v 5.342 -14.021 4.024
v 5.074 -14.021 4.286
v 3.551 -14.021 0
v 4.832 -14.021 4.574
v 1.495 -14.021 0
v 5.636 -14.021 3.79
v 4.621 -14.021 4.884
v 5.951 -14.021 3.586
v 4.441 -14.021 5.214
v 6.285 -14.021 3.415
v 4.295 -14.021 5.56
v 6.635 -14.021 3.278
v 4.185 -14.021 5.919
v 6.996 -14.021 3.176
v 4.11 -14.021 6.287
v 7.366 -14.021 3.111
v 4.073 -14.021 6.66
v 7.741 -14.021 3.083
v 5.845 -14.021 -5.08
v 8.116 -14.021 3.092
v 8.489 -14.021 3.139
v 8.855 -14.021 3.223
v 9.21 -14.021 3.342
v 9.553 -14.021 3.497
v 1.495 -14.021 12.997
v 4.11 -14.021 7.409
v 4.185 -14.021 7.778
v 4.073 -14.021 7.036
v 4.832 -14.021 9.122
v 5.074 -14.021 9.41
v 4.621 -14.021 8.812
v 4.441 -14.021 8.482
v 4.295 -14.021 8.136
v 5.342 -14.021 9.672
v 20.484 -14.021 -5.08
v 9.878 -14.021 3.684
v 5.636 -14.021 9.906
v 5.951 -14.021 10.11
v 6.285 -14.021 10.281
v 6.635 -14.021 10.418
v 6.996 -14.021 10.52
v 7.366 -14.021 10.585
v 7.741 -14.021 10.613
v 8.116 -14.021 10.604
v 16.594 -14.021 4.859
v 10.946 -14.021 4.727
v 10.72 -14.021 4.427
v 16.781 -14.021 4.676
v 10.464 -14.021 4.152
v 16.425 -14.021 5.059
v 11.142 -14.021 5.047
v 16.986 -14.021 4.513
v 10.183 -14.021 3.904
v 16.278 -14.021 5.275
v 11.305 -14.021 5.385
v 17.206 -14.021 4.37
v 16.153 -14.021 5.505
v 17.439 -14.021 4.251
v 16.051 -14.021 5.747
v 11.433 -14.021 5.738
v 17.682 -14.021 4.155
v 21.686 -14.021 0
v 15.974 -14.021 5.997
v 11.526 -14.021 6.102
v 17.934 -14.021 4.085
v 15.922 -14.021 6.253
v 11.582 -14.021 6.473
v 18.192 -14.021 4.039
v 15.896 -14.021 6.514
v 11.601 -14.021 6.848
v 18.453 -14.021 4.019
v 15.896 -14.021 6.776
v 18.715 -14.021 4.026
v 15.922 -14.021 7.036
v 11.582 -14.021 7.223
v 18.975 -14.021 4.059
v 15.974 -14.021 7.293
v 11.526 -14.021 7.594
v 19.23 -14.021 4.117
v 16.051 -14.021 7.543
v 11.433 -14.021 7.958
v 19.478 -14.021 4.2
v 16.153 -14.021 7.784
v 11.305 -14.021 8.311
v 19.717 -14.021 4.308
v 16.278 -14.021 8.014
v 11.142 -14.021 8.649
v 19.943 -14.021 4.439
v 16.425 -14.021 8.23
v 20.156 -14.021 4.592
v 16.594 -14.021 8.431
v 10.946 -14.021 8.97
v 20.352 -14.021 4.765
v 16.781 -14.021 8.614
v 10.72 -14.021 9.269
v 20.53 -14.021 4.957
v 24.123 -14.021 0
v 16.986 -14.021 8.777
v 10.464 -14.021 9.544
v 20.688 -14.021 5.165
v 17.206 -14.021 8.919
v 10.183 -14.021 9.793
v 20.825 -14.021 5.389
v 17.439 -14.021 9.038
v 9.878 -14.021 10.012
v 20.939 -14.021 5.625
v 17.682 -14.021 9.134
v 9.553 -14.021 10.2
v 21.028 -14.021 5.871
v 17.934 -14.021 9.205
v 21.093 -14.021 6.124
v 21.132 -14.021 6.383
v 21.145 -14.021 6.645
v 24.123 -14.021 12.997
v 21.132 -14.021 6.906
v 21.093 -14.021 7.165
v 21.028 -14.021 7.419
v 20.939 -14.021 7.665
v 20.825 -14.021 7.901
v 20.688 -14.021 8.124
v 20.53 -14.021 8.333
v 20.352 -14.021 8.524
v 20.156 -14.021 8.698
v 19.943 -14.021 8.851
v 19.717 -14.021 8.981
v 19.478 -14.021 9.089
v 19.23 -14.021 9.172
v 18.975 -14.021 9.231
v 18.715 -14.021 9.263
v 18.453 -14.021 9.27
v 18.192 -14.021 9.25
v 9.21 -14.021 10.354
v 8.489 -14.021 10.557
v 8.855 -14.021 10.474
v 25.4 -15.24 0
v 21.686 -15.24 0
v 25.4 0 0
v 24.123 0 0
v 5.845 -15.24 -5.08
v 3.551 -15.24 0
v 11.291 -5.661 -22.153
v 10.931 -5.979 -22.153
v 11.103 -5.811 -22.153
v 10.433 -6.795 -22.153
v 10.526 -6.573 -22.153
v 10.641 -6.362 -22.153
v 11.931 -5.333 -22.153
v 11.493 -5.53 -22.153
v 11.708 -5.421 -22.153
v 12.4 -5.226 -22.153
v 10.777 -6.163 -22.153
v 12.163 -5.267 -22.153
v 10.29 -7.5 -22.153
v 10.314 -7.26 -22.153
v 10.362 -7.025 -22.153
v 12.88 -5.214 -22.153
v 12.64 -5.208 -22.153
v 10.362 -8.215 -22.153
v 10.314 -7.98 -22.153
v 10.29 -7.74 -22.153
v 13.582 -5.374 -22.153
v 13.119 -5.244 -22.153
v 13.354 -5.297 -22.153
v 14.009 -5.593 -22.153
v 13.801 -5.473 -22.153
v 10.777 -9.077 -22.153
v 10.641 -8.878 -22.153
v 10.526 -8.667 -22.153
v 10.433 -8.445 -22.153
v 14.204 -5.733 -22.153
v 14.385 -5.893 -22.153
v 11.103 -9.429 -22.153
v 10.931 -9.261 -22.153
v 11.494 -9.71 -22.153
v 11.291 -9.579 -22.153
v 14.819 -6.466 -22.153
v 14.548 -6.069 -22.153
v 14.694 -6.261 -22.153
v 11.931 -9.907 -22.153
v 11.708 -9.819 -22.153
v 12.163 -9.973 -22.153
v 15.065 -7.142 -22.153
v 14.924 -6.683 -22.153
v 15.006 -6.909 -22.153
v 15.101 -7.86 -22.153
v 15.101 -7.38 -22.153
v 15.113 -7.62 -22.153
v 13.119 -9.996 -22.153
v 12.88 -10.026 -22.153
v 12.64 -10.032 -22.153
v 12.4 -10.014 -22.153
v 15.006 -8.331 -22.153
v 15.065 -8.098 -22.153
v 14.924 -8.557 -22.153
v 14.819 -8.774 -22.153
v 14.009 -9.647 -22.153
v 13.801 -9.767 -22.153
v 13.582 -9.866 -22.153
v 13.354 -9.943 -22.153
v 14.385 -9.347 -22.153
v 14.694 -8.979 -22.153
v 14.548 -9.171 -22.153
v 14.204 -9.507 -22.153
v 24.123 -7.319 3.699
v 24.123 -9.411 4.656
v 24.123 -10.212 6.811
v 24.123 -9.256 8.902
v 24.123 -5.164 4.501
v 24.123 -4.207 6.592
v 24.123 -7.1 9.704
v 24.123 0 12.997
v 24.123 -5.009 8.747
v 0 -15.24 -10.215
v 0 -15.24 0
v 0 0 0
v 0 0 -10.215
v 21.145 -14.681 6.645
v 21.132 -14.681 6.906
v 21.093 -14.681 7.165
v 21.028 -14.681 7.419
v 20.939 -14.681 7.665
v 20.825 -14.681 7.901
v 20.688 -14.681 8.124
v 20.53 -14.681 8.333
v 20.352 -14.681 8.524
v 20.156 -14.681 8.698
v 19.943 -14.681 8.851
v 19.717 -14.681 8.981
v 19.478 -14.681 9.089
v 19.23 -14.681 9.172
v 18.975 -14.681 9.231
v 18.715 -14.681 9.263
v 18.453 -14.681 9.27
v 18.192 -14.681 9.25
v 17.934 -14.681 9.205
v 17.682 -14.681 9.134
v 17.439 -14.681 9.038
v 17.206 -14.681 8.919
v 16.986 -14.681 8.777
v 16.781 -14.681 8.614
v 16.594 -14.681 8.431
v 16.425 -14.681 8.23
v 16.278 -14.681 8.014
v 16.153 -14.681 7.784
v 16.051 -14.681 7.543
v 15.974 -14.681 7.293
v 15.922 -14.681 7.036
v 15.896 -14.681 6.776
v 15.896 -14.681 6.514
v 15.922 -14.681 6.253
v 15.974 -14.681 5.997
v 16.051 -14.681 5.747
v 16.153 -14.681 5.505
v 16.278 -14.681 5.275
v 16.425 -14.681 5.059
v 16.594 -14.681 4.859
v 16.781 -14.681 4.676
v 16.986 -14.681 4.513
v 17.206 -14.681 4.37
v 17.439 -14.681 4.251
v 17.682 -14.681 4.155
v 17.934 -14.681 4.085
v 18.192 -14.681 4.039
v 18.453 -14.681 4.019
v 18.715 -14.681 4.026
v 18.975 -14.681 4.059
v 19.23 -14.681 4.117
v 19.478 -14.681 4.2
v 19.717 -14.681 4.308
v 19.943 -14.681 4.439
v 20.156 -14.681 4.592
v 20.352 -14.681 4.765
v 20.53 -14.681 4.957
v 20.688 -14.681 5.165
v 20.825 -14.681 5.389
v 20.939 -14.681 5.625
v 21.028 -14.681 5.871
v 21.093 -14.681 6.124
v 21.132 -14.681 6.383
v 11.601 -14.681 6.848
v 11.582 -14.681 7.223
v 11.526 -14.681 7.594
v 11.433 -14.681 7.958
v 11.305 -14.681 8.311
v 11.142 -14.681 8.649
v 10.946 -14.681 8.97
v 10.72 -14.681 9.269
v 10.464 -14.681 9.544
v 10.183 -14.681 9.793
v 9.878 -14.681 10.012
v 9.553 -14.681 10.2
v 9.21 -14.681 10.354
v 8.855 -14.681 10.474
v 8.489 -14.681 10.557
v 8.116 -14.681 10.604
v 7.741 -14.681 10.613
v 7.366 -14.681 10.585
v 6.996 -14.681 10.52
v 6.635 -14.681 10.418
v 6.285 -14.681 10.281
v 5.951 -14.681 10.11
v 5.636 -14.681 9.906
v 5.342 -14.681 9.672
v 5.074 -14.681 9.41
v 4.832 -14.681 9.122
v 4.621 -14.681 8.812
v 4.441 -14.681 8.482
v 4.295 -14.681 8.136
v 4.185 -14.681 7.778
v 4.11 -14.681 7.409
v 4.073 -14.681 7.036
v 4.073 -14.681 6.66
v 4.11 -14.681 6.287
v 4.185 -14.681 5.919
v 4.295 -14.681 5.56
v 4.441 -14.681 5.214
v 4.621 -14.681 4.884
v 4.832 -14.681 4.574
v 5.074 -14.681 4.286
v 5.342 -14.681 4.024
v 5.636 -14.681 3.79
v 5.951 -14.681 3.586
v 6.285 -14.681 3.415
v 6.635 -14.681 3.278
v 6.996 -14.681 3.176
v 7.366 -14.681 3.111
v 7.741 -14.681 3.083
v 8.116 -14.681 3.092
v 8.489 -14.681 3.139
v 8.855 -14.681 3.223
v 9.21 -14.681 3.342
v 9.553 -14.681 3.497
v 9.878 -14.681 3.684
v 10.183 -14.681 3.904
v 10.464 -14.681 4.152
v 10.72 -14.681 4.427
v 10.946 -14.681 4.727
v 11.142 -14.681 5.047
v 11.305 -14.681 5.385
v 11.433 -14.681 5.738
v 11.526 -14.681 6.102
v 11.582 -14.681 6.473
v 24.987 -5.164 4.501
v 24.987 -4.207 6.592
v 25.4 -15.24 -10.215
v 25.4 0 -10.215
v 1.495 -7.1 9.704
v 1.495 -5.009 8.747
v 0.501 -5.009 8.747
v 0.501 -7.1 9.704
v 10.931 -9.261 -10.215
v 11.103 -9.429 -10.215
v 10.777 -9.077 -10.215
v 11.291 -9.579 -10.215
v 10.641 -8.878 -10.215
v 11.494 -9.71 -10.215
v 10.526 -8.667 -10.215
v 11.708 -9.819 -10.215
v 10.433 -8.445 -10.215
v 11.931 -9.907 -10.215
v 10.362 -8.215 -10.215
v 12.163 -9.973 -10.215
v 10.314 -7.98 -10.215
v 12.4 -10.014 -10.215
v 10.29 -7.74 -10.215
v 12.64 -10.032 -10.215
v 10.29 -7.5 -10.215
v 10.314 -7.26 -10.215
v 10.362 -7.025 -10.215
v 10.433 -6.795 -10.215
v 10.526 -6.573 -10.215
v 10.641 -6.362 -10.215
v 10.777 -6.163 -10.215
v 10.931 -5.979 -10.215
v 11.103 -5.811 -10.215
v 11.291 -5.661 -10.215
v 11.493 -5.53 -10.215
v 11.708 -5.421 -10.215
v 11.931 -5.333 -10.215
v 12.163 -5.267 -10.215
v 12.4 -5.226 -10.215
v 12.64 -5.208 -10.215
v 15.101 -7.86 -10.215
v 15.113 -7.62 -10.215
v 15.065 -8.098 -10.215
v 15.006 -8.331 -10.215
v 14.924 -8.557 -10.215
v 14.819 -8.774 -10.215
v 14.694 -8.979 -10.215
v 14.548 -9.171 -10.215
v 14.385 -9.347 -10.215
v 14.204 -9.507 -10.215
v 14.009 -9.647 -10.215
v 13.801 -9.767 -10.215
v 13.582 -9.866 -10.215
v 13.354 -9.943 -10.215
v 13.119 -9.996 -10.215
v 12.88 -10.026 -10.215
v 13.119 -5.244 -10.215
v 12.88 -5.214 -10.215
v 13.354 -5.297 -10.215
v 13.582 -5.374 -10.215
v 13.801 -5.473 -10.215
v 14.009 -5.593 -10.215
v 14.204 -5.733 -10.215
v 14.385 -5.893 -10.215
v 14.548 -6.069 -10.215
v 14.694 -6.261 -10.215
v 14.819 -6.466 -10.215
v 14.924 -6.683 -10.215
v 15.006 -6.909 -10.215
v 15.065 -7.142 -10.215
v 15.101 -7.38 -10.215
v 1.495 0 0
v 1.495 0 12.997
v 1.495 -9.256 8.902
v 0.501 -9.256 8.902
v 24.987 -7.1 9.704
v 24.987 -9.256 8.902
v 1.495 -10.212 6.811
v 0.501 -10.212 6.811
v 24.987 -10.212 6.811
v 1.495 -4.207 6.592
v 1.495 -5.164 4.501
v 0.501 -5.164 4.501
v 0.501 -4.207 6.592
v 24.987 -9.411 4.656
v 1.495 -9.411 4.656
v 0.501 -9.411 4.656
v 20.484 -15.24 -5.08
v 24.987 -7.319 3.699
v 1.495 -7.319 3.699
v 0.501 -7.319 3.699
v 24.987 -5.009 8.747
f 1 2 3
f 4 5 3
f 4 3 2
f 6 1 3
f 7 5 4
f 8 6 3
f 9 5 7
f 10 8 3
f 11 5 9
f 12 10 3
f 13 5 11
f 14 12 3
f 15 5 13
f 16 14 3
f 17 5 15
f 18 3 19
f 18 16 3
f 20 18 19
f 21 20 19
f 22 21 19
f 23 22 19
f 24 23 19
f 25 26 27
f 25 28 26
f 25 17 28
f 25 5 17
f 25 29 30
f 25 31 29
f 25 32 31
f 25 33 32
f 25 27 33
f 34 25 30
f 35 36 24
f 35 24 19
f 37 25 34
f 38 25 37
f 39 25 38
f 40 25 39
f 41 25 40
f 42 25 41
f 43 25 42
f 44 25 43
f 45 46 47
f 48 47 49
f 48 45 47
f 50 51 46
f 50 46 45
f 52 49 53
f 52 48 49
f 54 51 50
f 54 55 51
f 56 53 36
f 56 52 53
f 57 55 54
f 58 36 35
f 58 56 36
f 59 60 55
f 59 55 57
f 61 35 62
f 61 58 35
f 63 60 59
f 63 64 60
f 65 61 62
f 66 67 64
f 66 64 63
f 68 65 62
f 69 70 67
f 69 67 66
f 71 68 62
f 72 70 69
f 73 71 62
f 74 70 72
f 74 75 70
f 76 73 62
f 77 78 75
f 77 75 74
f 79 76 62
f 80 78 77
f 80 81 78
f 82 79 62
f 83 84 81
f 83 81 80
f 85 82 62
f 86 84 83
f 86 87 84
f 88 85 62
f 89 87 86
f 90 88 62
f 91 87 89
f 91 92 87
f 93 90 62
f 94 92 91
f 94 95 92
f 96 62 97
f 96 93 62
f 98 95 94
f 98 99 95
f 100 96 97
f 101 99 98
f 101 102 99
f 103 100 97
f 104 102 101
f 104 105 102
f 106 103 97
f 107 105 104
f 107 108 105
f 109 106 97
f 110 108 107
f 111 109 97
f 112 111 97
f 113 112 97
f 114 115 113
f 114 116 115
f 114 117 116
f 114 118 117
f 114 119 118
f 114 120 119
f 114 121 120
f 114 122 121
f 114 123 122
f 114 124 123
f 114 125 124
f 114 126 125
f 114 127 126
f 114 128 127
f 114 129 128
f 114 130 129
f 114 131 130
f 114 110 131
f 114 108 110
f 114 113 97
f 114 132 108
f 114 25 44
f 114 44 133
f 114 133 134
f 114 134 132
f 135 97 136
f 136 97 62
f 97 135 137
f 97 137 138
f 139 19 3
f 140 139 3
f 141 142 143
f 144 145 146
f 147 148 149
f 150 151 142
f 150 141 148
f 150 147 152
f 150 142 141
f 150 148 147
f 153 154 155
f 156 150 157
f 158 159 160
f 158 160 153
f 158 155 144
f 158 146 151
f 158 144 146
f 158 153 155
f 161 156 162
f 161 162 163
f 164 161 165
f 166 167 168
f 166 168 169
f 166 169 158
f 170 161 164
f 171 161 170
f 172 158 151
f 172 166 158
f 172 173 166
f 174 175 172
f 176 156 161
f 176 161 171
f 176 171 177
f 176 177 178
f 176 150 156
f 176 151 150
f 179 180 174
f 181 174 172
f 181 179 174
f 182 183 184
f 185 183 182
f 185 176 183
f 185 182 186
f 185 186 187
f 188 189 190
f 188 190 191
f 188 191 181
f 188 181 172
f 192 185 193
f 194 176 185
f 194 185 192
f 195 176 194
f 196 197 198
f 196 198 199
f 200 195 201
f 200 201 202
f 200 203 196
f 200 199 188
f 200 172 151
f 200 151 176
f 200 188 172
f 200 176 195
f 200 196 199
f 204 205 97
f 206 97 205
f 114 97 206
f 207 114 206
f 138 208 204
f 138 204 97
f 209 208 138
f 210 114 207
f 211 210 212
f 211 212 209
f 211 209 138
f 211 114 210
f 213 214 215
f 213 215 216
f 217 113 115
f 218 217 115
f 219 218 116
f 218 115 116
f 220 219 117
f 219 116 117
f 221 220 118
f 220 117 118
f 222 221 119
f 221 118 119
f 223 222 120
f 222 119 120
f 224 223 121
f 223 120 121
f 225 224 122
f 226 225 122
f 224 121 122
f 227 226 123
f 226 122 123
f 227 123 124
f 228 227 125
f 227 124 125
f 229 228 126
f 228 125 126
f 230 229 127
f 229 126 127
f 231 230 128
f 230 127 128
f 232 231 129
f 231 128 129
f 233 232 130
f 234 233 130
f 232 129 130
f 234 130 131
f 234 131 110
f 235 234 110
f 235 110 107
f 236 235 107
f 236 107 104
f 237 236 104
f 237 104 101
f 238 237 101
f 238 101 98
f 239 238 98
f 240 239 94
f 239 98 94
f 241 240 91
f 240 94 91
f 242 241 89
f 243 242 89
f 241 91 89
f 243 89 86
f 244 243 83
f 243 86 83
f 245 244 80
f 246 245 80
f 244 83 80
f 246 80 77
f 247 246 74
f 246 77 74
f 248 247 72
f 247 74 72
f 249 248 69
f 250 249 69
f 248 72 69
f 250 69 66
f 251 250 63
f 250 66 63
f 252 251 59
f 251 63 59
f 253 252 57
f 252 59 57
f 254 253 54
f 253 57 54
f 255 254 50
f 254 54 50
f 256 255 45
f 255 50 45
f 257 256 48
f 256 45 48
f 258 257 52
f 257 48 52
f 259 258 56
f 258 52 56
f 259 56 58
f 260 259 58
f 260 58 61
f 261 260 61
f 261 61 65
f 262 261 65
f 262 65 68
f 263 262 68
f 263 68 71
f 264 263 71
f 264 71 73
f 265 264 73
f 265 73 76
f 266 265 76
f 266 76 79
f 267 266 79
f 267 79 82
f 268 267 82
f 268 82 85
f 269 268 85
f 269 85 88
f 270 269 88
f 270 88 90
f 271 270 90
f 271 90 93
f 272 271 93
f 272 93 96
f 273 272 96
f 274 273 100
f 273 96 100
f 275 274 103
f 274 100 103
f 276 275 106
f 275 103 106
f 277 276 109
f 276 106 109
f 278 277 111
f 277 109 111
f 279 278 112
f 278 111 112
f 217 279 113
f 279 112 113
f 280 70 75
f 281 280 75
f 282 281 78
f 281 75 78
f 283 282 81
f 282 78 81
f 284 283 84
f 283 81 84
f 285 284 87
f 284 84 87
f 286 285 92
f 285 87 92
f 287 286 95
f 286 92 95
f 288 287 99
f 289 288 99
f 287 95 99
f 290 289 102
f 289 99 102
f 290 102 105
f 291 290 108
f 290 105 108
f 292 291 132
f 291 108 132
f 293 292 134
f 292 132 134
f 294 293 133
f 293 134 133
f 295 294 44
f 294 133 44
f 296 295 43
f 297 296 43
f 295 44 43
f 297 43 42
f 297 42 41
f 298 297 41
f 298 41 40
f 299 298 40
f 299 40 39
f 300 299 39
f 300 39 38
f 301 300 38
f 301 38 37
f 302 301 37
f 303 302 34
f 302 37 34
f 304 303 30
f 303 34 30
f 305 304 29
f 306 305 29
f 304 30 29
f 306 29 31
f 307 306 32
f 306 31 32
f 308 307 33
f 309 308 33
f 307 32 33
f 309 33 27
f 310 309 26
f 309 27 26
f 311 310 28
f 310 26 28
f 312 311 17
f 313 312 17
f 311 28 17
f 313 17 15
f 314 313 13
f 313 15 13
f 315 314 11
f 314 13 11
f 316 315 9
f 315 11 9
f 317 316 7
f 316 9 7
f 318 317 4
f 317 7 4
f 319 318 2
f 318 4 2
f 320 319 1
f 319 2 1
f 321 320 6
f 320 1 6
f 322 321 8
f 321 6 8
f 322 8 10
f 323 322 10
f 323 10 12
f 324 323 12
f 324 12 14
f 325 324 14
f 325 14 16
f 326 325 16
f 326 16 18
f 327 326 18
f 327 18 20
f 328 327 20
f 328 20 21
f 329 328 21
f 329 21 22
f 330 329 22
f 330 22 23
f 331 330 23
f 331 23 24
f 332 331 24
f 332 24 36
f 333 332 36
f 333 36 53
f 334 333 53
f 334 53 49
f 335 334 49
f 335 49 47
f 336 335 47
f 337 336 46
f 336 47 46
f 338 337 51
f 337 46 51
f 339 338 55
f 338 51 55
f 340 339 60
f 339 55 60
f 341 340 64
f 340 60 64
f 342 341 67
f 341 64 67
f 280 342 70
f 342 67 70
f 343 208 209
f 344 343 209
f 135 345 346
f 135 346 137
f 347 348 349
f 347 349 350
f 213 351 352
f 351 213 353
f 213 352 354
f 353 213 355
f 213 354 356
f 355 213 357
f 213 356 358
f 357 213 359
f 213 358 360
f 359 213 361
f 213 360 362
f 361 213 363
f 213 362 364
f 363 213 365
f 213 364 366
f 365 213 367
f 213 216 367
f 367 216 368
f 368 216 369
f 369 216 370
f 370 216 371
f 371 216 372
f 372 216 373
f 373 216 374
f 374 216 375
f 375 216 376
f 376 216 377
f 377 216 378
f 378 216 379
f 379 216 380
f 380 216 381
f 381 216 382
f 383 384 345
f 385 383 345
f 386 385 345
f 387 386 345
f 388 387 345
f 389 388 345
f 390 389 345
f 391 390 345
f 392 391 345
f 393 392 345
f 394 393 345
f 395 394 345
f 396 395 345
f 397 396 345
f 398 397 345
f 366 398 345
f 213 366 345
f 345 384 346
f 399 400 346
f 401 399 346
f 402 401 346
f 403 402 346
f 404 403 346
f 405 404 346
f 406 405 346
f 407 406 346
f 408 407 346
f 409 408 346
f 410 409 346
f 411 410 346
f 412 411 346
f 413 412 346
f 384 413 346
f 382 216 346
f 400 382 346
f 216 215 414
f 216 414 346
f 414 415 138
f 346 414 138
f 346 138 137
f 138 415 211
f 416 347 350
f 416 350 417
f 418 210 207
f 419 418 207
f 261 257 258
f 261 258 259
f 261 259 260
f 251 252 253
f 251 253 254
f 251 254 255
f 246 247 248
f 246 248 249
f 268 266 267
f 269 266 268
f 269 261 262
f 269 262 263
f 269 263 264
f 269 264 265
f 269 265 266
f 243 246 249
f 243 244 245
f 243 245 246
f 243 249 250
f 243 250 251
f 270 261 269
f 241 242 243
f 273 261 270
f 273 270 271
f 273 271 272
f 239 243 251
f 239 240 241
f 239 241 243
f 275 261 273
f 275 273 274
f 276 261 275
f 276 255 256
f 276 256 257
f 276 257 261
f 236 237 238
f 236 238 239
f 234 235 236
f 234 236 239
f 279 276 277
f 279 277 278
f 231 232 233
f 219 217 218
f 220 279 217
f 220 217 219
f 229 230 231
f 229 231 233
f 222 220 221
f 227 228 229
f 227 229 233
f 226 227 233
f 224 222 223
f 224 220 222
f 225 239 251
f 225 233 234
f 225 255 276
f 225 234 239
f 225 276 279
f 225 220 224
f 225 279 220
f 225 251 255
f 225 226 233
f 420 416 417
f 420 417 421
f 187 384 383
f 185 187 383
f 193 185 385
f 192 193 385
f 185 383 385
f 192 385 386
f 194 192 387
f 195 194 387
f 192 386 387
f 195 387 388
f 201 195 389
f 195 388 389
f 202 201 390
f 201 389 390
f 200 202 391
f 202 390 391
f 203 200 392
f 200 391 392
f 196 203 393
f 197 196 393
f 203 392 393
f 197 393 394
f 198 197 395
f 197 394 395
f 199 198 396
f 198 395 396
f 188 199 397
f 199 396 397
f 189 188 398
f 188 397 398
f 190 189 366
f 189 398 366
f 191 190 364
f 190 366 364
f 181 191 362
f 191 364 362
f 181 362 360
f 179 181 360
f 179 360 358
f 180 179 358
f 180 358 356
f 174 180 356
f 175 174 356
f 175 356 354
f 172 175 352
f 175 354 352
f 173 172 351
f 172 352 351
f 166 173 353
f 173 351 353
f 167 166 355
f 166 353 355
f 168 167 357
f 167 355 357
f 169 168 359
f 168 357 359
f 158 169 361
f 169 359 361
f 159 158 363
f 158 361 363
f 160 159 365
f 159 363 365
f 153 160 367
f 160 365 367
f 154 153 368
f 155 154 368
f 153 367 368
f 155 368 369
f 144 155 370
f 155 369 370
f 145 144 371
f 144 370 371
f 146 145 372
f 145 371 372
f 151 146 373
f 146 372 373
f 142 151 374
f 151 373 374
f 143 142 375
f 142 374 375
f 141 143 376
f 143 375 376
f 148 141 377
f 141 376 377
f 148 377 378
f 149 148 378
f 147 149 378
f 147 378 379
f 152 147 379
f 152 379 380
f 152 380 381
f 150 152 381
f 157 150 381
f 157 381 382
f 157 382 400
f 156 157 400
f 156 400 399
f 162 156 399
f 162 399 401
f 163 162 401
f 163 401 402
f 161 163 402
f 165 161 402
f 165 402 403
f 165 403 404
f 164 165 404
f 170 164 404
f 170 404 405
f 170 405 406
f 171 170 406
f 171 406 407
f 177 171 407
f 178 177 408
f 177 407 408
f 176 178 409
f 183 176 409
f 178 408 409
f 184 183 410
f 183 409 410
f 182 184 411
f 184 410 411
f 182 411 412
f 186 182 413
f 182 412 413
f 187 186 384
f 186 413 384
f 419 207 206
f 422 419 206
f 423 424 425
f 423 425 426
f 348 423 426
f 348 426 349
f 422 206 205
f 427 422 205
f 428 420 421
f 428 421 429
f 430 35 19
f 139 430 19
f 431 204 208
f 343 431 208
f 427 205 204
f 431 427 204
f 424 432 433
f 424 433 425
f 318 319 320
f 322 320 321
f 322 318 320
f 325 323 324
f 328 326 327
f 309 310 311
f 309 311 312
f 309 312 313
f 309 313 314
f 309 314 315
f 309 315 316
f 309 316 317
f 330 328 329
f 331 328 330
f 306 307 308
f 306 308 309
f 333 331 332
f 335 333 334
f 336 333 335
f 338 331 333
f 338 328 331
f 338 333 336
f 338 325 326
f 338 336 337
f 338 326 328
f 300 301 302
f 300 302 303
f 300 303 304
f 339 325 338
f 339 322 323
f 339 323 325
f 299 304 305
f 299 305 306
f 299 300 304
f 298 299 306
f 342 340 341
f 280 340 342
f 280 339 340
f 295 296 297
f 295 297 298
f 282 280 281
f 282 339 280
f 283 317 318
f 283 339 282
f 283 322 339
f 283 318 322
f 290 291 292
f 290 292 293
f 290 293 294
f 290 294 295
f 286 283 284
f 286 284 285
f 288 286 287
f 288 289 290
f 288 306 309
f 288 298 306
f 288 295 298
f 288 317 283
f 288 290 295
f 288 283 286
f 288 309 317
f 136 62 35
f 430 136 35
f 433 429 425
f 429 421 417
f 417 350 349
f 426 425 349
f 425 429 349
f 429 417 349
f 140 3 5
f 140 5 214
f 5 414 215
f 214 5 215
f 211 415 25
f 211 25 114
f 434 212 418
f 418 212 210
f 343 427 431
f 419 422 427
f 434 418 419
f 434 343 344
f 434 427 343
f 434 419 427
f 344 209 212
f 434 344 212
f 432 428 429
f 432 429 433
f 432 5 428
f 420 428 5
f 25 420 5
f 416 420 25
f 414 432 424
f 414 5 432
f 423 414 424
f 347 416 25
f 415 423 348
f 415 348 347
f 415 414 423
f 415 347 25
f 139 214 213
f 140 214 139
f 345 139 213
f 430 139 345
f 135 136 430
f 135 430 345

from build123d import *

# Parameters (mm, degrees)
F1_DEPTH  = 15.24
F2_W      = 22.628388
F2_H      = 18.998165
F3_DEPTH  = 14.0208
F5_DEPTH  = 23.622
F6_DEPTH  = 0.8636
F7_R      = 3.766299
F7_R_2    = 2.625981
F8_DEPTH  = 0.6604
F9_R      = 2.413
F10_DEPTH = 11.938


with BuildPart() as f1:
    # F0 (on Front) → F1 (new body)
    with BuildSketch(Plane.XZ):
        Polygon((3.550537, 0), (0, 0), (0, -10.214623), (25.4, -10.214623), (25.4, 0), (21.685589, 0), (20.48387, -5.08), (5.844731, -5.08), align=None)
    extrude(amount=F1_DEPTH)

    # F2 (on Front) → F3 (join)
    with BuildSketch(Plane.XZ):
        with Locations((12.809009, 3.497728)):
            Rectangle(F2_W, F2_H)
    extrude(amount=F3_DEPTH)

    # F4 (on face) → F5 (join)
    with BuildSketch(Plane.YZ.offset(24.123203)):
        Polygon((-7.100273, 9.703922), (-9.255558, 8.901955), (-10.212499, 6.810862), (-9.410532, 4.655577), (-7.319439, 3.698636), (-5.164154, 4.500603), (-4.207213, 6.591696), (-5.00918, 8.746981), align=None)
    extrude(amount=-F5_DEPTH)

    # F4 (on face) → F6 (join)
    with BuildSketch(Plane.YZ.offset(24.123203)):
        Polygon((-7.100273, 9.703922), (-9.255558, 8.901955), (-10.212499, 6.810862), (-9.410532, 4.655577), (-7.319439, 3.698636), (-5.164154, 4.500603), (-4.207213, 6.591696), (-5.00918, 8.746981), align=None)
    extrude(amount=F6_DEPTH)

    # F7 (on face) → F8 (join)
    with BuildSketch(Plane.XZ.offset(14.0208)):
        with Locations((7.834505, 6.848152)):
            Circle(F7_R)
        with Locations((18.51875, 6.644643)):
            Circle(F7_R_2)
    extrude(amount=F8_DEPTH)

    # F9 (on face) → F10 (join)
    with BuildSketch(Plane(origin=(0, 0, -10.214623), x_dir=(1, 0, 0), z_dir=(0, 0, -1))):
        with Locations((12.7, 7.62)):
            Circle(F9_R)
    extrude(amount=F10_DEPTH)


solid = f1.part
